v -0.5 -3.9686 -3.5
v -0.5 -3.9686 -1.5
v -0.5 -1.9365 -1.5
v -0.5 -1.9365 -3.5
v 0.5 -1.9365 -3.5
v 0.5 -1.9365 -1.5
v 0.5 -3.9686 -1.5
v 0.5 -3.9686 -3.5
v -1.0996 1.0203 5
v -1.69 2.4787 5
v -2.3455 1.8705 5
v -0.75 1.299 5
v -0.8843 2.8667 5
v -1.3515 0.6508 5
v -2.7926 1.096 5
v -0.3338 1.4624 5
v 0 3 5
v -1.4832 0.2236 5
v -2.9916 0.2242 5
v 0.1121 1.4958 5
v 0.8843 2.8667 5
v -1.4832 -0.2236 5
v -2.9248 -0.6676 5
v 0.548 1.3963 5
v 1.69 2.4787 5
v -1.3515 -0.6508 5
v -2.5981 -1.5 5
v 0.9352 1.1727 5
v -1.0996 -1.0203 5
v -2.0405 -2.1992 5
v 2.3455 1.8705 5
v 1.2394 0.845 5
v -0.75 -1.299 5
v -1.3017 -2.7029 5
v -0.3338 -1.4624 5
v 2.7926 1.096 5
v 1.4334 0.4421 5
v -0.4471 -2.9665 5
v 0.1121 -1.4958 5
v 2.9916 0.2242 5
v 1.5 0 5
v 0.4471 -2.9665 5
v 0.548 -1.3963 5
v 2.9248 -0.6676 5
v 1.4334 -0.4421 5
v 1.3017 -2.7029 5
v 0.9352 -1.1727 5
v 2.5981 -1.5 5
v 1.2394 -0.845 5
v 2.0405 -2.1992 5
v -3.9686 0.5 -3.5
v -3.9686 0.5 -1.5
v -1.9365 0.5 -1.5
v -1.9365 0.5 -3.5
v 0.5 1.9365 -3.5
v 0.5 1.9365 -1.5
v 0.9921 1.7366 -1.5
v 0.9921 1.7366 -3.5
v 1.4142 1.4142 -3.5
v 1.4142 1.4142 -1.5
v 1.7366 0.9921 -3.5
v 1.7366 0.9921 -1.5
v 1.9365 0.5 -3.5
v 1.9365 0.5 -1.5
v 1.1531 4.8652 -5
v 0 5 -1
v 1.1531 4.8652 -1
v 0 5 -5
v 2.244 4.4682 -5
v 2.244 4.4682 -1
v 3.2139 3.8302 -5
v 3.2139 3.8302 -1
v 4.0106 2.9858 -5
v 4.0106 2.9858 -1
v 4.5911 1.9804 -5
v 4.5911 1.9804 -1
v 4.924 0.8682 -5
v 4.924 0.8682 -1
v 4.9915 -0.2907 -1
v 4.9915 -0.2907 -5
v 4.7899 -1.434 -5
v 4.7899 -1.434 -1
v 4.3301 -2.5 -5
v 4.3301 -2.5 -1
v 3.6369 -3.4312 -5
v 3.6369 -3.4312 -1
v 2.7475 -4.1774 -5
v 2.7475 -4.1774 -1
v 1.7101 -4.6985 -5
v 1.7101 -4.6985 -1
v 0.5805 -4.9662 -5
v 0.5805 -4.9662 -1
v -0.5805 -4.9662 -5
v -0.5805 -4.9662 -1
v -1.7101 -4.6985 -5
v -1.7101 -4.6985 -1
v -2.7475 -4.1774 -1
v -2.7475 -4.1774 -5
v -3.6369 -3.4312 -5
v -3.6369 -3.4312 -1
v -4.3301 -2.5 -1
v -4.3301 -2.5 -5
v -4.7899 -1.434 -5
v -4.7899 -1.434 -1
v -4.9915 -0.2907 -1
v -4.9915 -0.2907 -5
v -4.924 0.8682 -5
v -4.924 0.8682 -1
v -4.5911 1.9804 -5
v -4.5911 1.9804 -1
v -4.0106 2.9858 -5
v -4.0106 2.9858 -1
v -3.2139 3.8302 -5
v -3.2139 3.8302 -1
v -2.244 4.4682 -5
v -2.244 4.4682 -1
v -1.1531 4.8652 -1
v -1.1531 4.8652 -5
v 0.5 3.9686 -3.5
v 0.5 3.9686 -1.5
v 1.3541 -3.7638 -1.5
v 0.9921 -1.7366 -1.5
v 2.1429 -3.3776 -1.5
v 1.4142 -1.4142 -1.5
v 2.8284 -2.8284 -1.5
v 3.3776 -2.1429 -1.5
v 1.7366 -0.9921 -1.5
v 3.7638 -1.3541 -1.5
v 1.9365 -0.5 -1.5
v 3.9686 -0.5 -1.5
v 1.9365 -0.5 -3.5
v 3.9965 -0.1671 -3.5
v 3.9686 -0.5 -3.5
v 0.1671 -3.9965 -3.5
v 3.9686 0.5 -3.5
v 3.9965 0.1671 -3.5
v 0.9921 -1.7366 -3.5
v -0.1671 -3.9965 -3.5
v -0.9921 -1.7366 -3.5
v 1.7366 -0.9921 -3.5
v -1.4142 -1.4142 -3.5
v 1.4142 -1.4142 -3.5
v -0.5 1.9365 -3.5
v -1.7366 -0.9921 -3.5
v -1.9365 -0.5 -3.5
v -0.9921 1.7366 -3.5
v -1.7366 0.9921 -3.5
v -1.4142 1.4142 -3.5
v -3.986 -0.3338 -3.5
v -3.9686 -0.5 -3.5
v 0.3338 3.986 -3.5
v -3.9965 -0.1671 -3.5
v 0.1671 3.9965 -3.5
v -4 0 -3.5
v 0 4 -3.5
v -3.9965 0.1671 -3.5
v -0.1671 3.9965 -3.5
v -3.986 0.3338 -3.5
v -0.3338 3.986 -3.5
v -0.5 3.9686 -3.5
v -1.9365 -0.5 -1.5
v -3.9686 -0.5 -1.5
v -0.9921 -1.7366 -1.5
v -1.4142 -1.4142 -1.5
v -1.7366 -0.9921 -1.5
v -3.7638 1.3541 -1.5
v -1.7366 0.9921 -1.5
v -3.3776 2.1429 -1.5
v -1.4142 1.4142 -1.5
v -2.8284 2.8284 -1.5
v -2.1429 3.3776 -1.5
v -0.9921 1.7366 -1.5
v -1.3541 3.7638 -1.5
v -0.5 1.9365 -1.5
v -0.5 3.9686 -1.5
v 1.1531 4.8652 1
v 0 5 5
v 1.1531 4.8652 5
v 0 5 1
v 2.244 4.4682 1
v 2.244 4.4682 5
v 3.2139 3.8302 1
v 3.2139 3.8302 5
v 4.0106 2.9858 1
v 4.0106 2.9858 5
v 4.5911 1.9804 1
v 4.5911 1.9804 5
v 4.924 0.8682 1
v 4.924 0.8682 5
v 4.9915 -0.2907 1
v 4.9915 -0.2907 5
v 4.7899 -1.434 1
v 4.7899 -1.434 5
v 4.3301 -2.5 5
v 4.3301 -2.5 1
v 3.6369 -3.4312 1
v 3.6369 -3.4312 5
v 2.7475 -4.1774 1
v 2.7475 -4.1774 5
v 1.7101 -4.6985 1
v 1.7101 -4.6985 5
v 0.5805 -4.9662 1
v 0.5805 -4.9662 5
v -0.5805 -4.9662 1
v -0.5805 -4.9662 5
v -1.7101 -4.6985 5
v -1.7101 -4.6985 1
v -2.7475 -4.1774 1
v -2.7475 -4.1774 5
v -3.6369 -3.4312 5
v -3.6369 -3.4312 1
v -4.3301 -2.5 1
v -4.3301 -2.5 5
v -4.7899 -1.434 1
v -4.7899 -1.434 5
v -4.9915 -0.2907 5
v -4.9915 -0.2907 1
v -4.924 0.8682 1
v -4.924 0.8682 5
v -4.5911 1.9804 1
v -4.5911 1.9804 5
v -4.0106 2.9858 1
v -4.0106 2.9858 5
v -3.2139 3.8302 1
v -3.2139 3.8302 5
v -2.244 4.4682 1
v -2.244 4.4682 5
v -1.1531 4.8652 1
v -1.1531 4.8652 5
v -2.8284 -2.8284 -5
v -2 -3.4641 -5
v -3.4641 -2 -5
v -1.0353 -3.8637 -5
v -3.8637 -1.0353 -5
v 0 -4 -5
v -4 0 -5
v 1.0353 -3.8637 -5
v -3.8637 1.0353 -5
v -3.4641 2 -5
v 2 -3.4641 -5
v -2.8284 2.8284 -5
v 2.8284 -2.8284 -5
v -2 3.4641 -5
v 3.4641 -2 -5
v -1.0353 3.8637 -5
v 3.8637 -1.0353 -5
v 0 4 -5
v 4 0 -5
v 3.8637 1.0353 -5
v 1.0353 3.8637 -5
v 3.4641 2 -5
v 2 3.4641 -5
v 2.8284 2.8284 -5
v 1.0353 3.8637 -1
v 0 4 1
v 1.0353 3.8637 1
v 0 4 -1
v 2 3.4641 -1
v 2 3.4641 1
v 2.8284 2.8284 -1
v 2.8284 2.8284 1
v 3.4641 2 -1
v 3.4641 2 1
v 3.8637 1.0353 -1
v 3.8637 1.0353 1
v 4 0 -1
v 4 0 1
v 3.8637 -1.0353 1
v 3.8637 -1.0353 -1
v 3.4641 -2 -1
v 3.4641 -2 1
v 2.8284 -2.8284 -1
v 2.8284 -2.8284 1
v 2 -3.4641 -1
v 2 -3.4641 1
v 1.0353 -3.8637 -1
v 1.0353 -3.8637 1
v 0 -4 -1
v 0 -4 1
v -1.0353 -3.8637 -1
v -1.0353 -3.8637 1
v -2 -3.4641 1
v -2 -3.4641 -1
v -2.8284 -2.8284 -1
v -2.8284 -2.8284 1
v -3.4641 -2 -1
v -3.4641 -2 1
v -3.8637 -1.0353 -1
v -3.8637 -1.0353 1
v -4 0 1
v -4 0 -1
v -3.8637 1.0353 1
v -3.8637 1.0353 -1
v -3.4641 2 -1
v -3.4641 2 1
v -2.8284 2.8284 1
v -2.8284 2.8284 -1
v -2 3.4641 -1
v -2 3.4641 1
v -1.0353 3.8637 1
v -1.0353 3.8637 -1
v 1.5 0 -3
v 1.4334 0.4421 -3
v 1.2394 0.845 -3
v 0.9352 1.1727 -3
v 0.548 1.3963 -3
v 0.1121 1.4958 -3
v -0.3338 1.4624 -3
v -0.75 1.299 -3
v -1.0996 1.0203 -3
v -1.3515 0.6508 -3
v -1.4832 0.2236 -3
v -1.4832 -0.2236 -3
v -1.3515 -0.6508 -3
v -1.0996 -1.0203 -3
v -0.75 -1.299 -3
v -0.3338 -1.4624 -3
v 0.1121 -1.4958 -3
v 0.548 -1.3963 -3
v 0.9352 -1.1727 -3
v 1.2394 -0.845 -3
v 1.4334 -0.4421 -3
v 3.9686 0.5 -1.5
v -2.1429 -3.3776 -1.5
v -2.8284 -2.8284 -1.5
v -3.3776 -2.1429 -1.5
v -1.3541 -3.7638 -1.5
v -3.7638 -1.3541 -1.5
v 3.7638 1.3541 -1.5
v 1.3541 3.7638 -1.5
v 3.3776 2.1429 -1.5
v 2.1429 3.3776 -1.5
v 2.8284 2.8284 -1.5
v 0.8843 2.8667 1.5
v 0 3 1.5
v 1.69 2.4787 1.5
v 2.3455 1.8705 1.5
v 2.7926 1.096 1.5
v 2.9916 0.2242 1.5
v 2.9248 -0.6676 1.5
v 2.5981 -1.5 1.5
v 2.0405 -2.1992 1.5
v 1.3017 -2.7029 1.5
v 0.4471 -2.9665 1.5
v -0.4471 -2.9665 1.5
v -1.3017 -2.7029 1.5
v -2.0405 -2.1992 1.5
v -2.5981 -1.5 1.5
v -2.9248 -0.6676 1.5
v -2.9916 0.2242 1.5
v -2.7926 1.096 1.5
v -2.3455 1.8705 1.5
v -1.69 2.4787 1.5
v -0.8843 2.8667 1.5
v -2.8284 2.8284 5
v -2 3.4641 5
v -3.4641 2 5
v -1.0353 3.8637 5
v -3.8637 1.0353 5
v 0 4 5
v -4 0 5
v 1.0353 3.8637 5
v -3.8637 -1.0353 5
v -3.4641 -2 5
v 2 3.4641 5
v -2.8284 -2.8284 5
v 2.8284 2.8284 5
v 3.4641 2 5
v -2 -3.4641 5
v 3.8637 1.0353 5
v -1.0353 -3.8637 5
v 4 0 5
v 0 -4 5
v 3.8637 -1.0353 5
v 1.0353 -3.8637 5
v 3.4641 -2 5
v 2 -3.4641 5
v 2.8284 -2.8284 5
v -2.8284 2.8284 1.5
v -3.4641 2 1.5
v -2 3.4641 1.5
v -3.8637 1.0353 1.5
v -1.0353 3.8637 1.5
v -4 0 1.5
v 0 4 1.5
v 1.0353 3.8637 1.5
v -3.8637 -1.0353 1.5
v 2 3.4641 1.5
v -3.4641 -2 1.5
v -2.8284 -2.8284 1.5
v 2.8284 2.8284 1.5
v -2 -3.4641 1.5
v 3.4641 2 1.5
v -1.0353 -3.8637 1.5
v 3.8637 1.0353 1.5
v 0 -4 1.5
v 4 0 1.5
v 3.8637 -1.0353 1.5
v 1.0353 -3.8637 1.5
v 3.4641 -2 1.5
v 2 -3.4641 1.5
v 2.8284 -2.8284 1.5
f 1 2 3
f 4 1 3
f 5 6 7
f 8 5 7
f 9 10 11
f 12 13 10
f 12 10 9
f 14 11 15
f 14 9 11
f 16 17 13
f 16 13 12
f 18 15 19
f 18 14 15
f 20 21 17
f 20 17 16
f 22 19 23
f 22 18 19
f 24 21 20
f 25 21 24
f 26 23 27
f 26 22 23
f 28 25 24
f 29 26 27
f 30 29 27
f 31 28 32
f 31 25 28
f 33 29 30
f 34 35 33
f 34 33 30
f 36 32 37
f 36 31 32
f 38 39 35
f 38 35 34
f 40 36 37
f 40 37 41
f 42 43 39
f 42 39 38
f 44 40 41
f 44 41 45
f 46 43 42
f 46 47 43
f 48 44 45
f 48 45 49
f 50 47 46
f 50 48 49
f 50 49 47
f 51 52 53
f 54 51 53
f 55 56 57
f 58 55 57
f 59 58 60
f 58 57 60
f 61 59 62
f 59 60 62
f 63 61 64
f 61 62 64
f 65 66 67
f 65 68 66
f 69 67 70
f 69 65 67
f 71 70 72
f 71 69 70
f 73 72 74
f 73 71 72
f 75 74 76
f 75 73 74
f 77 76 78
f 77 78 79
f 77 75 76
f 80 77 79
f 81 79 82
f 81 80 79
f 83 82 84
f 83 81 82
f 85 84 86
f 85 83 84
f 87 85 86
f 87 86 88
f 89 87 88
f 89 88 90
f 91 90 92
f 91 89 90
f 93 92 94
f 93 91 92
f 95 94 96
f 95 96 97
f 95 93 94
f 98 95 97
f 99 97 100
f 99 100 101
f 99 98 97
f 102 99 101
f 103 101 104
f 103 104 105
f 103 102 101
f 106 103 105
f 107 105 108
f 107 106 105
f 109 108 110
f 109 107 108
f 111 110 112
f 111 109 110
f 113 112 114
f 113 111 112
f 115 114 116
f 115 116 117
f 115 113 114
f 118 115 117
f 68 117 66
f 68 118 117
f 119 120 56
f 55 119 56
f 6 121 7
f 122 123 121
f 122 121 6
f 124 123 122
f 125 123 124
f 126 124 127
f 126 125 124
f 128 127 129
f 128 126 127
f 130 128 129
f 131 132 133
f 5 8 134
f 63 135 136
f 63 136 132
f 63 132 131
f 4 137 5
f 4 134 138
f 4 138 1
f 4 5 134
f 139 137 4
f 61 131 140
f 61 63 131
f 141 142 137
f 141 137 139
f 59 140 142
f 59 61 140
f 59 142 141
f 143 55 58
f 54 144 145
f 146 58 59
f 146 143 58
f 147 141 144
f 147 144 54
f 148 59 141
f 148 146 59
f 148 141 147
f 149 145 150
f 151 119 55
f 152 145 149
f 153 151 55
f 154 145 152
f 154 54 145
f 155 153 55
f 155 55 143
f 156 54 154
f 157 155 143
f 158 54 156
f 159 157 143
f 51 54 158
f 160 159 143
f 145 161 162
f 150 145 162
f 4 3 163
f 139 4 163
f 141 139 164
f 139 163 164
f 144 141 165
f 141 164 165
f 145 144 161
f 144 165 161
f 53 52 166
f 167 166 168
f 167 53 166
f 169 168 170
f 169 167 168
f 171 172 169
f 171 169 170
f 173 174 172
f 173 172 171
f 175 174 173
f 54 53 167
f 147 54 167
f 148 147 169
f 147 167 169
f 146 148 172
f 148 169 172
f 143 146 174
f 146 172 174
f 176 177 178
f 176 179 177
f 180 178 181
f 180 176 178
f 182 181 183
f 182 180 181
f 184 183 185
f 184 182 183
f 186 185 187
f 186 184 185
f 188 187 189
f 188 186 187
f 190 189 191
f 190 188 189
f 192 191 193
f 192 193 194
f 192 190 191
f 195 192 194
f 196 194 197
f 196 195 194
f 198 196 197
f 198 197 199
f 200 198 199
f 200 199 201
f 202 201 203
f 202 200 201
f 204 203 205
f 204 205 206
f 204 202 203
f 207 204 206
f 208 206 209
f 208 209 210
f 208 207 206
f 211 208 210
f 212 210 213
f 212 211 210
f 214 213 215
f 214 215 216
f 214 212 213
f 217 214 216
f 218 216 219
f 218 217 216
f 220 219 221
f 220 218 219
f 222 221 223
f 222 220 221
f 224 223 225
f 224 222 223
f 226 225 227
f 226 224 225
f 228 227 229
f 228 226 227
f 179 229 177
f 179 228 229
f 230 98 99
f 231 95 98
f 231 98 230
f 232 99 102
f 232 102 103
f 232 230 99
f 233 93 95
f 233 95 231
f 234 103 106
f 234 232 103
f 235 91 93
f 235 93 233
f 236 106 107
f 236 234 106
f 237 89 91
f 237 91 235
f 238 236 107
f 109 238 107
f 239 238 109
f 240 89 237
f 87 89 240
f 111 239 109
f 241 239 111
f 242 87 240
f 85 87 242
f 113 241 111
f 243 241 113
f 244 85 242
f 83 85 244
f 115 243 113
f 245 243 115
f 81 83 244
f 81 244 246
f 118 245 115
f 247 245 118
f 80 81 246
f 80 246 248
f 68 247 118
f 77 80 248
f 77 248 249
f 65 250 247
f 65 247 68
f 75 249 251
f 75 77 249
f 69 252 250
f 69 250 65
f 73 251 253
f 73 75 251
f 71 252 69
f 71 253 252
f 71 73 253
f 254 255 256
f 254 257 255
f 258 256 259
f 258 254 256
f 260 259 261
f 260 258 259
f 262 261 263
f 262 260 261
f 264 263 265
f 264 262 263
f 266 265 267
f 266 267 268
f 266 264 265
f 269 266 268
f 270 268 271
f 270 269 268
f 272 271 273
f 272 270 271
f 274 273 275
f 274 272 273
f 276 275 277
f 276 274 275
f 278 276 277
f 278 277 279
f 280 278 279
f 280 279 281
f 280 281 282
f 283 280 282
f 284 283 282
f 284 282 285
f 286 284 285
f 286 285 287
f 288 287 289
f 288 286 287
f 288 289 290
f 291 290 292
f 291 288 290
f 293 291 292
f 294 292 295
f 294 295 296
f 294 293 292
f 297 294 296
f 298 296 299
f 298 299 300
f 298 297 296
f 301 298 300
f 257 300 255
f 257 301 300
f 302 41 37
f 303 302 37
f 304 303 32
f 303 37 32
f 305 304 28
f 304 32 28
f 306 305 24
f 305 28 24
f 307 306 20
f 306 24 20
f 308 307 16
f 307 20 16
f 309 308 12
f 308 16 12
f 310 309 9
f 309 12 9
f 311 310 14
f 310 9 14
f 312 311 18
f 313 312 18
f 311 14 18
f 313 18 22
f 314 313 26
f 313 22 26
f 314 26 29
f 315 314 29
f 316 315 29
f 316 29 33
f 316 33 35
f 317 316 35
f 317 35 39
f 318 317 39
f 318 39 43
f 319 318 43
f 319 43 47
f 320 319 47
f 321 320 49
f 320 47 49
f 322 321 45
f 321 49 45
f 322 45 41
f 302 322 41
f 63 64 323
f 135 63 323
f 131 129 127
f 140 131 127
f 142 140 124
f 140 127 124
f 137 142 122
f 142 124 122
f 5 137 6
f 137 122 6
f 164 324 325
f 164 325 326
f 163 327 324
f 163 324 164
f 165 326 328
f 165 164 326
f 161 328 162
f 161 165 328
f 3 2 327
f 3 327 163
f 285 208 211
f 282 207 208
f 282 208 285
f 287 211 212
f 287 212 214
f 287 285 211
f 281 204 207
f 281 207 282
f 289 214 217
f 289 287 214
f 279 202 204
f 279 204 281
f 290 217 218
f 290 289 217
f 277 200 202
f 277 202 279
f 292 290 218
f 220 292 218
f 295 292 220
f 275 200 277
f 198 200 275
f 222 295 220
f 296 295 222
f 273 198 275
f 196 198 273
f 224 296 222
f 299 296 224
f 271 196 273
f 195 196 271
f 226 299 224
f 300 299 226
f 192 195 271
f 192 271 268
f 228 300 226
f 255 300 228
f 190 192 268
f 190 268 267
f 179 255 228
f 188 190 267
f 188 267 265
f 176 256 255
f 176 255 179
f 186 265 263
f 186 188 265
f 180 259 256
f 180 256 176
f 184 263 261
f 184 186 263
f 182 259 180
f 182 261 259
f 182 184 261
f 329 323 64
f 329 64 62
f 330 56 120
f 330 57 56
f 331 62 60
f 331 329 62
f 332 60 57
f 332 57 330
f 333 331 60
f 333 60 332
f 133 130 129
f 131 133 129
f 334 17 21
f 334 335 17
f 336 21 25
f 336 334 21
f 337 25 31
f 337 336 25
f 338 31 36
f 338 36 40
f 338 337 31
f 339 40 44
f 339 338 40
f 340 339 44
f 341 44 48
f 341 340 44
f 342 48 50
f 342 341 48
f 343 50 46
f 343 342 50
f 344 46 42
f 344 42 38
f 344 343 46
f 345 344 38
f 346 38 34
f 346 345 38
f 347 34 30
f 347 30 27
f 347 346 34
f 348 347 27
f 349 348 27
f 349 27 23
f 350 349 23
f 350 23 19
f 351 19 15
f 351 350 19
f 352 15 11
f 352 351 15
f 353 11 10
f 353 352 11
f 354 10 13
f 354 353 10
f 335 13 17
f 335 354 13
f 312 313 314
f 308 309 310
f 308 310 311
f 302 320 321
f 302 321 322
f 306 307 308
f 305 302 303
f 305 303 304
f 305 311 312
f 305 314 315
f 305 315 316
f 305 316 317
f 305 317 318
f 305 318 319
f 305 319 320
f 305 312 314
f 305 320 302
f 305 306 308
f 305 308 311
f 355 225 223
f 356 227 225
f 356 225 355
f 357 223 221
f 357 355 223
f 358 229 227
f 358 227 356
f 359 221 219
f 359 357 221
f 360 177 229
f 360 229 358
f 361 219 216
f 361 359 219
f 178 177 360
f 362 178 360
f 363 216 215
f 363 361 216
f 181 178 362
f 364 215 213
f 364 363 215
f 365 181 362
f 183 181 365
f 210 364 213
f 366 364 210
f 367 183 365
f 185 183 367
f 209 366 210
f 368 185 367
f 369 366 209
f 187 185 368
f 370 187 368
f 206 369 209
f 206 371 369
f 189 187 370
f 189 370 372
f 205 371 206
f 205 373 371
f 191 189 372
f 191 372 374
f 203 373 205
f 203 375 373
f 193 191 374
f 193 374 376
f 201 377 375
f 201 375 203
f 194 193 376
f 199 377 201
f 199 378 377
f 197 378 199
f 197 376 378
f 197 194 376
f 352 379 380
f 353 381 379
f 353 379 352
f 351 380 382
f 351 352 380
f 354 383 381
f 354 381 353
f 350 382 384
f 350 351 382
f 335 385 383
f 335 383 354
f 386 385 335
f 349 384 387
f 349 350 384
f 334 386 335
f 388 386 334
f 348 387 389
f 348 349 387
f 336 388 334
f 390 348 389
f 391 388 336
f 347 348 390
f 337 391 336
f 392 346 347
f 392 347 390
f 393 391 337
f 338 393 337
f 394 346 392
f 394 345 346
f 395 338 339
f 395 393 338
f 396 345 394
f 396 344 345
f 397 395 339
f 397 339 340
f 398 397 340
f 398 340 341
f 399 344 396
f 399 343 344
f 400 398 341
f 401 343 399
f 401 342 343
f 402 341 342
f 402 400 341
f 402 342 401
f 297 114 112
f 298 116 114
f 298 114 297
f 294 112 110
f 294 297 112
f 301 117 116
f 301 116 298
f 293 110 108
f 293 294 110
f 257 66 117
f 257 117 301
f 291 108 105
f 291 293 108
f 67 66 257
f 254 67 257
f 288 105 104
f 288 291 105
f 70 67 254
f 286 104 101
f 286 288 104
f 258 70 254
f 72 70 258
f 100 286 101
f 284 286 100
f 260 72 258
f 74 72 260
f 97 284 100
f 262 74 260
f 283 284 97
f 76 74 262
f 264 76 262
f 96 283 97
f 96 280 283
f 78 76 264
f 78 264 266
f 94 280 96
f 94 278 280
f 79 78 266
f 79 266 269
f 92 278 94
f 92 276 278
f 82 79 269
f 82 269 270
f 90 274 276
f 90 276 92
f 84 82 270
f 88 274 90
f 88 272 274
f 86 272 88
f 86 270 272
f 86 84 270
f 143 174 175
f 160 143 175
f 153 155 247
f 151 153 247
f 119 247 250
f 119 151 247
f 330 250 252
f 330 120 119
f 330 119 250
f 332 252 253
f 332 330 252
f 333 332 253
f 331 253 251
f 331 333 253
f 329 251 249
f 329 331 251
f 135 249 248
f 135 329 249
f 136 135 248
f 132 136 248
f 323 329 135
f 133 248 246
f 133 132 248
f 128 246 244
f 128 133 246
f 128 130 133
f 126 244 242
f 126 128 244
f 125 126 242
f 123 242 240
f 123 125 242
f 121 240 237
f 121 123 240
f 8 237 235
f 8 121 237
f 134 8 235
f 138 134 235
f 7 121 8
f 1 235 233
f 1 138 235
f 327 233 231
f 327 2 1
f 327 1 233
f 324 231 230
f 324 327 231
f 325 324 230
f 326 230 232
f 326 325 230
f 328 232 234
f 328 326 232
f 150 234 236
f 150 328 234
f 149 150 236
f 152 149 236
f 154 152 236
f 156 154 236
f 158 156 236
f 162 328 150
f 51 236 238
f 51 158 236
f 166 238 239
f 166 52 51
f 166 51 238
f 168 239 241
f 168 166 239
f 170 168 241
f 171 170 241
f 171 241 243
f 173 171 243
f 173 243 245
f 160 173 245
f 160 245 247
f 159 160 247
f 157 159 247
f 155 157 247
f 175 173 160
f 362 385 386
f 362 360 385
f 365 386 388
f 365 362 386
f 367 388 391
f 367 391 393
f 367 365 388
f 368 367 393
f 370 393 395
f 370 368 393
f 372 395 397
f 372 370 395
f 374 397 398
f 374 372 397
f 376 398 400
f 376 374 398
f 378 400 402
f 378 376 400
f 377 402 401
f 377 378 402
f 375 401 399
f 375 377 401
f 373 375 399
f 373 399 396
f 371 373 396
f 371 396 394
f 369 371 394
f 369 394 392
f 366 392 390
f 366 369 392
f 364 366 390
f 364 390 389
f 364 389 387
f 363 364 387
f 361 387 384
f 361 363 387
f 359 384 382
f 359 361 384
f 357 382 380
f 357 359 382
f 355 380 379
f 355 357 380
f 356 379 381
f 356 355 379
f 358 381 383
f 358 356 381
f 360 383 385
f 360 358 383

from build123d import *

# Parameters (mm, degrees)
BOSS_EXTRUDE1_DEPTH = 2
SKETCH4_R           = 1.5
CUT_EXTRUDE1_DEPTH  = 8


with BuildPart() as part:
    # Sketch2 → Revolve1 (revolve)
    with BuildSketch(Plane(origin=(0, 0, 0), x_dir=(0, 0, -1), z_dir=(1, 0, 0))):
        Polygon((-5, 0), (-5, 3), (-1.5, 3), (-1.5, 4), (-5, 4), (-5, 5), (-1, 5), (-1, 4), (1, 4), (1, 5), (5, 5), (5, 4), (1.5, 4), (1.5, 0), (0, 0), align=None)
    revolve(axis=Axis((0, 0, 7.451058405), (0, 0, -1)))

    # Sketch3 → Boss-Extrude1 (add)
    with BuildSketch(Plane(origin=(0, 0, -1.5), x_dir=(-1, 0, 0), z_dir=(0, 0, -1))):
        with BuildLine():
            ThreePointArc((1.936491673, 0.5), (1.414213562, 1.414213562), (0.5, 1.936491673))
            Line((0.5, 1.936491673), (0.5, 3.968626967))
            ThreePointArc((0.5, 3.968626967), (0, 4), (-0.5, 3.968626967))
            Line((-0.5, 3.968626967), (-0.5, 1.936491673))
            ThreePointArc((-0.5, 1.936491673), (-1.414213562, 1.414213562), (-1.936491673, 0.5))
            Line((-1.936491673, 0.5), (-3.968626967, 0.5))
            ThreePointArc((-3.968626967, 0.5), (-4, 0), (-3.968626967, -0.5))
            Line((-3.968626967, -0.5), (-1.936491673, -0.5))
            ThreePointArc((-1.936491673, -0.5), (-1.414213562, -1.414213562), (-0.5, -1.936491673))
            Line((-0.5, -1.936491673), (-0.5, -3.968626967))
            ThreePointArc((-0.5, -3.968626967), (0, -4), (0.5, -3.968626967))
            Line((0.5, -3.968626967), (0.5, -1.936491673))
            ThreePointArc((0.5, -1.936491673), (1.414213562, -1.414213562), (1.936491673, -0.5))
            Line((1.936491673, -0.5), (3.968626967, -0.5))
            ThreePointArc((3.968626967, -0.5), (3.992149037, -0.25049165), (4, 0))
            ThreePointArc((4, 0), (3.992149037, 0.25049165), (3.968626967, 0.5))
            Line((3.968626967, 0.5), (1.936491673, 0.5))
        make_face()
    extrude(amount=BOSS_EXTRUDE1_DEPTH)

    # Sketch4 → Cut-Extrude1 (cut)
    with BuildSketch(Plane.XY.offset(5)):
        Circle(SKETCH4_R)
    extrude(amount=-CUT_EXTRUDE1_DEPTH, mode=Mode.SUBTRACT)


solid = part.part
